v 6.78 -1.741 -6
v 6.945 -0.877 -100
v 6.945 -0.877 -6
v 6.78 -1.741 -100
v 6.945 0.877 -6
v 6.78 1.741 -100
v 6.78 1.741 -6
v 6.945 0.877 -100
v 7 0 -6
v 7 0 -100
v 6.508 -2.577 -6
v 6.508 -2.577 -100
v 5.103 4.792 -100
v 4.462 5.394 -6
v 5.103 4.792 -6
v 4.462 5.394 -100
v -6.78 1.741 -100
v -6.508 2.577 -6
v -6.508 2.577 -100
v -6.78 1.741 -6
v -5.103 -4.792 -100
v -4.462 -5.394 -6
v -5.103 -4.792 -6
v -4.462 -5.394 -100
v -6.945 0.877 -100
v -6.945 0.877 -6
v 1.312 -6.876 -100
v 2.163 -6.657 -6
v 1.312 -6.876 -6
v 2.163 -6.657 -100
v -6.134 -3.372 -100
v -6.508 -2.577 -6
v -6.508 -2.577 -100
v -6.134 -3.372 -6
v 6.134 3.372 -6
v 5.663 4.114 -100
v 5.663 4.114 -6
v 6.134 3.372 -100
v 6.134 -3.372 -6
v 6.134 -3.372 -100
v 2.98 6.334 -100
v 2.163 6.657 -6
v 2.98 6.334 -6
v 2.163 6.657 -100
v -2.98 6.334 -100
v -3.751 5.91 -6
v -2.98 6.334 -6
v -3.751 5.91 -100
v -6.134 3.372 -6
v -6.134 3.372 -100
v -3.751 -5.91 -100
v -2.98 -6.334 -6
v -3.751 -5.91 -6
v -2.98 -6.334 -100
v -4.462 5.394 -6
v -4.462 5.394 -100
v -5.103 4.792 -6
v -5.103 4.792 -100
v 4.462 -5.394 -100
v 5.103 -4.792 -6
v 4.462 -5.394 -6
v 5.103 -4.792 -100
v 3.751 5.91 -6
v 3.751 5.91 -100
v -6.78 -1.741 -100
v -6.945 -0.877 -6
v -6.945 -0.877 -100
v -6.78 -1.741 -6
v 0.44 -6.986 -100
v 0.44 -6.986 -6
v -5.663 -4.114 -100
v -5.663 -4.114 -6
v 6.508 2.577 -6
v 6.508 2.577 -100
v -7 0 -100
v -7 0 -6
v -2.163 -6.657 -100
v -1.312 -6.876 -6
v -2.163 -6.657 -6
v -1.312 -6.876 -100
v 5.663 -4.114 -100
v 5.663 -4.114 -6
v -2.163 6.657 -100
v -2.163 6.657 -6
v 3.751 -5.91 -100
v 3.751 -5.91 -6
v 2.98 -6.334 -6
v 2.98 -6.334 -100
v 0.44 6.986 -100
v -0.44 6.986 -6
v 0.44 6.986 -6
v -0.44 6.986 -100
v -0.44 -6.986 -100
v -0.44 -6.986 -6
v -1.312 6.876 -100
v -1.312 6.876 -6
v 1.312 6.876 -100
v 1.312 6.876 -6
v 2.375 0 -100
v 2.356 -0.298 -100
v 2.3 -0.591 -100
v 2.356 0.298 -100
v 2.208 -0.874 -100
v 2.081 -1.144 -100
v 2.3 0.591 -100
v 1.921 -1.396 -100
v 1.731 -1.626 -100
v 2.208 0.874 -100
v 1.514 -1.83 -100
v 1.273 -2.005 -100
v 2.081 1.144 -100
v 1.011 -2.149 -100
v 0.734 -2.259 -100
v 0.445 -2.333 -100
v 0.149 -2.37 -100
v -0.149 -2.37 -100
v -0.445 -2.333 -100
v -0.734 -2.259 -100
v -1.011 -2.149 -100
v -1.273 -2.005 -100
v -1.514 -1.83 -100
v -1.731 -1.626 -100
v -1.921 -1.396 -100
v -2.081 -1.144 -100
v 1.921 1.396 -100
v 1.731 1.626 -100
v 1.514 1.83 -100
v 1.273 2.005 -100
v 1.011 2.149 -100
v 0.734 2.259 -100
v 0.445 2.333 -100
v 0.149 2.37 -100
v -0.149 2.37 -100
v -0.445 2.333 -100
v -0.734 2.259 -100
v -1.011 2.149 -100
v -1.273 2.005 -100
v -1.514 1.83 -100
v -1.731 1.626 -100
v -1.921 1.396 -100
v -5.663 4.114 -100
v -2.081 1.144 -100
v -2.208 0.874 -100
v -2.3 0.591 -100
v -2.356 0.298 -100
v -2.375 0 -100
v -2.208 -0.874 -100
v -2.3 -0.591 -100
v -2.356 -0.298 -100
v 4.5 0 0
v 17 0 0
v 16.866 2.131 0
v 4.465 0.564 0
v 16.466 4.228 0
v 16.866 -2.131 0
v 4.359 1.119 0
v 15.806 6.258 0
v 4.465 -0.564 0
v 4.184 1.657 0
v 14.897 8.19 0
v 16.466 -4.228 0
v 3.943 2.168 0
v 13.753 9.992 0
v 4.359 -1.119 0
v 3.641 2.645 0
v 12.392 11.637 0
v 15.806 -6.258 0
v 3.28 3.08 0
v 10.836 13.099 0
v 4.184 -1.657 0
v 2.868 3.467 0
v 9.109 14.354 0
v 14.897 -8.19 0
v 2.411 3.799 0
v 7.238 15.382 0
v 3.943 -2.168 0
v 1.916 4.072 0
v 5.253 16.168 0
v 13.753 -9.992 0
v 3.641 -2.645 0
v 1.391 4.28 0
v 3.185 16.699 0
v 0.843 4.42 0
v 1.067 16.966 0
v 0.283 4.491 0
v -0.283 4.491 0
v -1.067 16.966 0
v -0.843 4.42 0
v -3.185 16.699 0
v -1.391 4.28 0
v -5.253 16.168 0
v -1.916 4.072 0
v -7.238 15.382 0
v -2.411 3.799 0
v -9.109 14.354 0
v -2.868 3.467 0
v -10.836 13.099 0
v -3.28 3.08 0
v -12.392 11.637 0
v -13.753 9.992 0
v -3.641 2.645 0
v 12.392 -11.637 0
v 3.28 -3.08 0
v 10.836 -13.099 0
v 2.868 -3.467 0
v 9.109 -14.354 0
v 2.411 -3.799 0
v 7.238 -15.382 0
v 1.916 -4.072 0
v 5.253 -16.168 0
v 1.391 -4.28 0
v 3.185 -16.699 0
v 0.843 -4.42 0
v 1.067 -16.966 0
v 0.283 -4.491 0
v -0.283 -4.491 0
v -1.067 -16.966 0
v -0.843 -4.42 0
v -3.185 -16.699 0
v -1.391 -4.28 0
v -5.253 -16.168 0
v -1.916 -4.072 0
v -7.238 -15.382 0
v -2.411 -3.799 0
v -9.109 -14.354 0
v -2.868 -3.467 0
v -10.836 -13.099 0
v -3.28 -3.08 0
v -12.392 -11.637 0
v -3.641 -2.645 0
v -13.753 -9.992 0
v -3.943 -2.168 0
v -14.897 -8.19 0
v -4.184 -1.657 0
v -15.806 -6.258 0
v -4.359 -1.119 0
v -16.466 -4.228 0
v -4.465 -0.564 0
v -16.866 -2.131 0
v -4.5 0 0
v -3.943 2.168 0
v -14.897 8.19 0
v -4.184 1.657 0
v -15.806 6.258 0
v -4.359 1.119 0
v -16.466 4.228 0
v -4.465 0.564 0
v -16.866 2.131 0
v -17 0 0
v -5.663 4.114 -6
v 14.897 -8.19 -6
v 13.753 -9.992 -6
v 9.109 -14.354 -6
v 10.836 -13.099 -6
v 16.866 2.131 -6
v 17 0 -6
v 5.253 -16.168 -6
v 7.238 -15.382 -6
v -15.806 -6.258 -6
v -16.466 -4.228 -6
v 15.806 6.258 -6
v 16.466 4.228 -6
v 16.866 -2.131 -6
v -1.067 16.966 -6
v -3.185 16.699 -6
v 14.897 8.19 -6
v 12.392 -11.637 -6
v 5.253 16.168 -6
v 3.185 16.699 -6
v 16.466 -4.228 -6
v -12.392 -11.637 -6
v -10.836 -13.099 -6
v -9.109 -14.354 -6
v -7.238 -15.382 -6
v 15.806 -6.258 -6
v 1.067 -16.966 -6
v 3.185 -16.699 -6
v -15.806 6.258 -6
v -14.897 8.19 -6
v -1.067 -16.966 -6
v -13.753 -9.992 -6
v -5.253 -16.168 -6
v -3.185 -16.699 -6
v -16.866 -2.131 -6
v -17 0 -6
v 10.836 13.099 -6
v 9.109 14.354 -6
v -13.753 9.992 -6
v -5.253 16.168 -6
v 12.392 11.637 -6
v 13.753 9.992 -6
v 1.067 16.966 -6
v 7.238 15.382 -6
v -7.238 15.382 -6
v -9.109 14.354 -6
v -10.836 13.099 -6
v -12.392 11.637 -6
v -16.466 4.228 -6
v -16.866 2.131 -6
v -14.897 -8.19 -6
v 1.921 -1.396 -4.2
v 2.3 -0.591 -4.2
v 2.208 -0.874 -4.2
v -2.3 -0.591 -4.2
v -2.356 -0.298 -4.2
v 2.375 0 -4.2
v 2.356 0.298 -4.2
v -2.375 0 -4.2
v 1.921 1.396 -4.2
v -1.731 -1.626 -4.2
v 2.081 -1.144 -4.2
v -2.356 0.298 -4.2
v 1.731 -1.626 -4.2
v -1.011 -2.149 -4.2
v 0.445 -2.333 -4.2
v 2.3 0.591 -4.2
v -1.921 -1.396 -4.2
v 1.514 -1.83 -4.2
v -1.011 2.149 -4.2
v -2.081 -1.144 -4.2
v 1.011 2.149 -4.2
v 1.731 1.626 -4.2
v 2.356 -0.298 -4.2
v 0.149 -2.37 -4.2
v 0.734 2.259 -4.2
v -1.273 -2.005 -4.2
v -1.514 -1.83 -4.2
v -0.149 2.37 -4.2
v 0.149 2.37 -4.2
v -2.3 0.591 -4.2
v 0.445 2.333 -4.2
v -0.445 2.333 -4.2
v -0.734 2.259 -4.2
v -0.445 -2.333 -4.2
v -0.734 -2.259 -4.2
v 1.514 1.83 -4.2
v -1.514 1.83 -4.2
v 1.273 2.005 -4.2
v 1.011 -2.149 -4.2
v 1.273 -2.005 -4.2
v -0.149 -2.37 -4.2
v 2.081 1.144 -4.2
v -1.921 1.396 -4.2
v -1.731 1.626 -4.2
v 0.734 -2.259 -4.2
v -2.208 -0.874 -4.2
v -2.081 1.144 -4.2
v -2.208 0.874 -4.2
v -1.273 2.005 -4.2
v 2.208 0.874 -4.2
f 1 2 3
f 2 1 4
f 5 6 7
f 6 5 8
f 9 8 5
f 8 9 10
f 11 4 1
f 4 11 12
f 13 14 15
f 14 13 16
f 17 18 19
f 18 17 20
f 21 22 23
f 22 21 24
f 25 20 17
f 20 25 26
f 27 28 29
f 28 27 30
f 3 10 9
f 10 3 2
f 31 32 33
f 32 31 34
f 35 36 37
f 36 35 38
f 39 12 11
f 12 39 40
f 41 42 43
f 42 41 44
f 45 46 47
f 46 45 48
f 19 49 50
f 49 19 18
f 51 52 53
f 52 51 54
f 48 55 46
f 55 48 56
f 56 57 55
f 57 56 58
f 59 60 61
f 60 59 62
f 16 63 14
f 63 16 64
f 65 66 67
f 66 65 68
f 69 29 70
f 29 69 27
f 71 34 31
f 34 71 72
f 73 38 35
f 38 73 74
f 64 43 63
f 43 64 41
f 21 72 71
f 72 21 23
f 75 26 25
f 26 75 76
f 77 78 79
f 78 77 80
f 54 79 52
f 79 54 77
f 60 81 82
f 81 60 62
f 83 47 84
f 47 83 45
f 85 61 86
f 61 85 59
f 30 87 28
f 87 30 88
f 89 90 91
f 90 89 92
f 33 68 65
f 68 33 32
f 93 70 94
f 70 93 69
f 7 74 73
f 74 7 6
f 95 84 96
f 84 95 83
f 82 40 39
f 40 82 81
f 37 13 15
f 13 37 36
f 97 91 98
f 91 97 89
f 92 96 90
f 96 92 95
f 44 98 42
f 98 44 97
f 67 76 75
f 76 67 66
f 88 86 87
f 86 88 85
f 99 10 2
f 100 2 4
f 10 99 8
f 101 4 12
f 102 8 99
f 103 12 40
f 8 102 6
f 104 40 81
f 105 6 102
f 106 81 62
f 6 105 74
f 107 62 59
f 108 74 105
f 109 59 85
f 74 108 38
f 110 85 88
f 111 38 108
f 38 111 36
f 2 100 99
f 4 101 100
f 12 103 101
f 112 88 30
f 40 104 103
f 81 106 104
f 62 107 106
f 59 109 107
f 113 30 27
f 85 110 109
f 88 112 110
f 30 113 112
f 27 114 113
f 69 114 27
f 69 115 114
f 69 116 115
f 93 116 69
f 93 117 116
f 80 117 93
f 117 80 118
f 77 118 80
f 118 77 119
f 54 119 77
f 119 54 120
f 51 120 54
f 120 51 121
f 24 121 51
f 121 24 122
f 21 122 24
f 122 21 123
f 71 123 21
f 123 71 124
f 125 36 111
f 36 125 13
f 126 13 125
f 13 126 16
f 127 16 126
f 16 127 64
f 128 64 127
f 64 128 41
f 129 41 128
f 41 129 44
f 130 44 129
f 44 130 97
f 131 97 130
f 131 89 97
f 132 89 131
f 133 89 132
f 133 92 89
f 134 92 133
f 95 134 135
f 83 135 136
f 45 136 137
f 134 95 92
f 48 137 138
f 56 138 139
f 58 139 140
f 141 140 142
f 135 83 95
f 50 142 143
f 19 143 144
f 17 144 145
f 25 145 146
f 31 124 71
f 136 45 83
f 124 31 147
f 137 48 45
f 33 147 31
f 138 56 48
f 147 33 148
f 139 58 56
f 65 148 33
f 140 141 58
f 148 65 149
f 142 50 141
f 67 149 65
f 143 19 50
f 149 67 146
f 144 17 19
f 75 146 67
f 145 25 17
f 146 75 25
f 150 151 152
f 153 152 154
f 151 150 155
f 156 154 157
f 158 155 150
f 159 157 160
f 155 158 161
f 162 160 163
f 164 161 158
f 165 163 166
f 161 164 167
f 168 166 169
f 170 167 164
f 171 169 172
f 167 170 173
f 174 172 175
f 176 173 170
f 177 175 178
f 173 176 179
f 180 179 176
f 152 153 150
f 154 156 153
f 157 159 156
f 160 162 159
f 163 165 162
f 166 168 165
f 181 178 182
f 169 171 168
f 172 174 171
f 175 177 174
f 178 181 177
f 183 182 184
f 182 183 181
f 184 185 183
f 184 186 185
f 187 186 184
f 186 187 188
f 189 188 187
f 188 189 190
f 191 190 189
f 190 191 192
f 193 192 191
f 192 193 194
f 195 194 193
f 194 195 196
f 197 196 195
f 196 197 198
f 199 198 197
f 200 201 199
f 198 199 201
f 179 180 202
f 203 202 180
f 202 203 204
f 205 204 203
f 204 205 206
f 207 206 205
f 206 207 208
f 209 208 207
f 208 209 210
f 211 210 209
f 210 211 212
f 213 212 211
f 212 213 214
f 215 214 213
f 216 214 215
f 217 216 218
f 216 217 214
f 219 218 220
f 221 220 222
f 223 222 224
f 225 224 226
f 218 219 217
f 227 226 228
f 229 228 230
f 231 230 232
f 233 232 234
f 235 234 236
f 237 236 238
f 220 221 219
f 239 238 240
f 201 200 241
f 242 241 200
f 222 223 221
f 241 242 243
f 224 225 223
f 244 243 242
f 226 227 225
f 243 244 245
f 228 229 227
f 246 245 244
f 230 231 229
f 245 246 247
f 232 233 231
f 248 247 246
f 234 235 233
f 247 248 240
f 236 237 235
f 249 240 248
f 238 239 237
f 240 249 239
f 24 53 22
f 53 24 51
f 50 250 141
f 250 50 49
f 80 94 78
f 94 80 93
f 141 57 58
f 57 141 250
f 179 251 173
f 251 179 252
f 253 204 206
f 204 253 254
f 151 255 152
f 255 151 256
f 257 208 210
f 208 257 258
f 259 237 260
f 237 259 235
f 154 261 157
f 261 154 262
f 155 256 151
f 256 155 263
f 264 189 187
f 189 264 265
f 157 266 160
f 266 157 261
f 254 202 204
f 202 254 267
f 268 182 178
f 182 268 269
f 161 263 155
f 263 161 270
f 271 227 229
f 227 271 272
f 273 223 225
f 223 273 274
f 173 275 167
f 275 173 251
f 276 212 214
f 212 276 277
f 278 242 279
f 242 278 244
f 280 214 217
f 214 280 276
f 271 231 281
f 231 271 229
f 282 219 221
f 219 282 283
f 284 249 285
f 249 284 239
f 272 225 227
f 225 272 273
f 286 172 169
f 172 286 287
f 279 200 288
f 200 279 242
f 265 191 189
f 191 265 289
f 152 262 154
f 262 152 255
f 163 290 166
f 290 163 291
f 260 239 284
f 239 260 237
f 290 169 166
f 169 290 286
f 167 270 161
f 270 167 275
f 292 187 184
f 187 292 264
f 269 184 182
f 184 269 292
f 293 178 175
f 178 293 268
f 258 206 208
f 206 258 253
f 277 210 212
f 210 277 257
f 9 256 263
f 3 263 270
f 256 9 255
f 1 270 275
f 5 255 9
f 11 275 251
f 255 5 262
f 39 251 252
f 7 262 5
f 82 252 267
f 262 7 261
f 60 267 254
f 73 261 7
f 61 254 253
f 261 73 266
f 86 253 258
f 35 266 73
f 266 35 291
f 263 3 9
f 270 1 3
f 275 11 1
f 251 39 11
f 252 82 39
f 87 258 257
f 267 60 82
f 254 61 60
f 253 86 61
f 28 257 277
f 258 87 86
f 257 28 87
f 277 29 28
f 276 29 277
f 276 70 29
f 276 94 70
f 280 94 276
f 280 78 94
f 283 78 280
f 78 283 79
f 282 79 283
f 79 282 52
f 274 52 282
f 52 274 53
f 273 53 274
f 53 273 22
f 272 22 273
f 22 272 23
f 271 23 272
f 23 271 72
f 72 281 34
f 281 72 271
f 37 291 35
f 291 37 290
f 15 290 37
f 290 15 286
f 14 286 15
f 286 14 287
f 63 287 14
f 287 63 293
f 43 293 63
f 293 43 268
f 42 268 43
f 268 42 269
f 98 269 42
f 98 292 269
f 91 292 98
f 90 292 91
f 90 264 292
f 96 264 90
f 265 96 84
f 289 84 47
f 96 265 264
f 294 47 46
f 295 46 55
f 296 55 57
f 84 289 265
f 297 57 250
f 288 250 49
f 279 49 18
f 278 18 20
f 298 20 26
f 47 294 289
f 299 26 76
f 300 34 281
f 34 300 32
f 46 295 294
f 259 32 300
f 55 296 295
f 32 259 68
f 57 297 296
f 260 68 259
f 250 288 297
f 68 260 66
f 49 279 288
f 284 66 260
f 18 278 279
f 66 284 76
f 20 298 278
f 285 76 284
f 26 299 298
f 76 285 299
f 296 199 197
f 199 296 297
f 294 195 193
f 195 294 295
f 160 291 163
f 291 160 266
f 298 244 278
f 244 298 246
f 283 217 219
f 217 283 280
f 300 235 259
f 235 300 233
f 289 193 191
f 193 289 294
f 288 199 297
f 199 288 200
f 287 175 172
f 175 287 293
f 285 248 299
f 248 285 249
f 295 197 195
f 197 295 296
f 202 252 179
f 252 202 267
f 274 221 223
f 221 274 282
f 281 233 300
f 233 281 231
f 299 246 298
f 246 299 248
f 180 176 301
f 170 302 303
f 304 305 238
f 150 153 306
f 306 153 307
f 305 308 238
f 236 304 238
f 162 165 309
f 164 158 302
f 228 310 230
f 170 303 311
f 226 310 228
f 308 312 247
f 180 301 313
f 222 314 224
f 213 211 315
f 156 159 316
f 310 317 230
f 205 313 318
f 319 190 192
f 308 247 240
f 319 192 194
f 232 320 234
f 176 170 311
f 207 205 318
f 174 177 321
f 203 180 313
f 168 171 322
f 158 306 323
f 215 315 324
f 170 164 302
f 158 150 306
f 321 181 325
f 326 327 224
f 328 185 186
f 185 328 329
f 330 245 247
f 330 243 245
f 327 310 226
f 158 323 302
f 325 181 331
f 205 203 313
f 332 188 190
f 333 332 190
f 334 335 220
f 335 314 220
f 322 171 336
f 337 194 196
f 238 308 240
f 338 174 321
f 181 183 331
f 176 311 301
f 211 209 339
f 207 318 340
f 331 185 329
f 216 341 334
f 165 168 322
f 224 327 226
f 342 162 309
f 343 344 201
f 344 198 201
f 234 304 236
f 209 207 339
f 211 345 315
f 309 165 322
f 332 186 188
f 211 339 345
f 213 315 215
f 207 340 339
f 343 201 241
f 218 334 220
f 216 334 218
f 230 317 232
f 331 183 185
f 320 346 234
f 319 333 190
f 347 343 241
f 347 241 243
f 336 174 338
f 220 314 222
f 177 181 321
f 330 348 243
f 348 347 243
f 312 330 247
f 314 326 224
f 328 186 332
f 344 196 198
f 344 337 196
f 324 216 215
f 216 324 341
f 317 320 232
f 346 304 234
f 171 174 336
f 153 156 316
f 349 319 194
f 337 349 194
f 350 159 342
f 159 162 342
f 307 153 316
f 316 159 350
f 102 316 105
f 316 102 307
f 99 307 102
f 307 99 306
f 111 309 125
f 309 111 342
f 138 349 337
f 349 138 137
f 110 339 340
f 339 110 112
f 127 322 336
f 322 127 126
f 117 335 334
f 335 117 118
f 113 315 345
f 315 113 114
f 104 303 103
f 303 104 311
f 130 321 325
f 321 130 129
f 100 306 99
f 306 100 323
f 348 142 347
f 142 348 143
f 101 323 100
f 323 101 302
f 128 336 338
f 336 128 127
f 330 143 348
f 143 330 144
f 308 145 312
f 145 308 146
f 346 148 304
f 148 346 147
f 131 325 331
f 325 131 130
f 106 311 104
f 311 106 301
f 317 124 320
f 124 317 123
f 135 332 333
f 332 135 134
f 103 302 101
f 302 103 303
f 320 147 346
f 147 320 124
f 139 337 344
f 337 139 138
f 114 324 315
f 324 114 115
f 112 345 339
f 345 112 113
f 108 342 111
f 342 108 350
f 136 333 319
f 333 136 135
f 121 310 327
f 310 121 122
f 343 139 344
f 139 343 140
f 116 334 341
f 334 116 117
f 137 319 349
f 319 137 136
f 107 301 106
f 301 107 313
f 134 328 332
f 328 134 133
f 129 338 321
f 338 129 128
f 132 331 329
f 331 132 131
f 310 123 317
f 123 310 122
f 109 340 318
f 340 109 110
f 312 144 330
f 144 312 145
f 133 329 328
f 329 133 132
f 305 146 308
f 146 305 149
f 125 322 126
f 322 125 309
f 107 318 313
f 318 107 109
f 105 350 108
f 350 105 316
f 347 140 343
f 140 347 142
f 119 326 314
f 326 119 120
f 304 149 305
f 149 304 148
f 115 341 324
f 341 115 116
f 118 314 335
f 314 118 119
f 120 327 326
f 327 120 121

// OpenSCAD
$fn = 50;


difference() {
	union() {
		translate(v = [0, 0, -100.0000000000]) {
			cylinder(h = 100, r = 7.0000000000);
		}
		translate(v = [0, 0, -6.0000000000]) {
			cylinder(h = 6, r = 17.0000000000);
		}
	}
	union() {
		translate(v = [0, 0, 0]) {
			rotate(a = [0, 0, 0]) {
				difference() {
					union() {
						#translate(v = [0, 0, -100.0000000000]) {
							cylinder(h = 100, r = 2.2500000000);
						}
						#translate(v = [0, 0, -4.2000000000]) {
							cylinder(h = 4.2000000000, r = 7.0000000000, r1 = 2.3750000000, r2 = 4.5000000000);
						}
						#translate(v = [0, 0, -100.0000000000]) {
							cylinder(h = 100, r = 2.3750000000);
						}
						#translate(v = [0, 0, -100.0000000000]) {
							cylinder(h = 100, r = 2.2500000000);
						}
					}
					union();
				}
			}
		}
	}
}
